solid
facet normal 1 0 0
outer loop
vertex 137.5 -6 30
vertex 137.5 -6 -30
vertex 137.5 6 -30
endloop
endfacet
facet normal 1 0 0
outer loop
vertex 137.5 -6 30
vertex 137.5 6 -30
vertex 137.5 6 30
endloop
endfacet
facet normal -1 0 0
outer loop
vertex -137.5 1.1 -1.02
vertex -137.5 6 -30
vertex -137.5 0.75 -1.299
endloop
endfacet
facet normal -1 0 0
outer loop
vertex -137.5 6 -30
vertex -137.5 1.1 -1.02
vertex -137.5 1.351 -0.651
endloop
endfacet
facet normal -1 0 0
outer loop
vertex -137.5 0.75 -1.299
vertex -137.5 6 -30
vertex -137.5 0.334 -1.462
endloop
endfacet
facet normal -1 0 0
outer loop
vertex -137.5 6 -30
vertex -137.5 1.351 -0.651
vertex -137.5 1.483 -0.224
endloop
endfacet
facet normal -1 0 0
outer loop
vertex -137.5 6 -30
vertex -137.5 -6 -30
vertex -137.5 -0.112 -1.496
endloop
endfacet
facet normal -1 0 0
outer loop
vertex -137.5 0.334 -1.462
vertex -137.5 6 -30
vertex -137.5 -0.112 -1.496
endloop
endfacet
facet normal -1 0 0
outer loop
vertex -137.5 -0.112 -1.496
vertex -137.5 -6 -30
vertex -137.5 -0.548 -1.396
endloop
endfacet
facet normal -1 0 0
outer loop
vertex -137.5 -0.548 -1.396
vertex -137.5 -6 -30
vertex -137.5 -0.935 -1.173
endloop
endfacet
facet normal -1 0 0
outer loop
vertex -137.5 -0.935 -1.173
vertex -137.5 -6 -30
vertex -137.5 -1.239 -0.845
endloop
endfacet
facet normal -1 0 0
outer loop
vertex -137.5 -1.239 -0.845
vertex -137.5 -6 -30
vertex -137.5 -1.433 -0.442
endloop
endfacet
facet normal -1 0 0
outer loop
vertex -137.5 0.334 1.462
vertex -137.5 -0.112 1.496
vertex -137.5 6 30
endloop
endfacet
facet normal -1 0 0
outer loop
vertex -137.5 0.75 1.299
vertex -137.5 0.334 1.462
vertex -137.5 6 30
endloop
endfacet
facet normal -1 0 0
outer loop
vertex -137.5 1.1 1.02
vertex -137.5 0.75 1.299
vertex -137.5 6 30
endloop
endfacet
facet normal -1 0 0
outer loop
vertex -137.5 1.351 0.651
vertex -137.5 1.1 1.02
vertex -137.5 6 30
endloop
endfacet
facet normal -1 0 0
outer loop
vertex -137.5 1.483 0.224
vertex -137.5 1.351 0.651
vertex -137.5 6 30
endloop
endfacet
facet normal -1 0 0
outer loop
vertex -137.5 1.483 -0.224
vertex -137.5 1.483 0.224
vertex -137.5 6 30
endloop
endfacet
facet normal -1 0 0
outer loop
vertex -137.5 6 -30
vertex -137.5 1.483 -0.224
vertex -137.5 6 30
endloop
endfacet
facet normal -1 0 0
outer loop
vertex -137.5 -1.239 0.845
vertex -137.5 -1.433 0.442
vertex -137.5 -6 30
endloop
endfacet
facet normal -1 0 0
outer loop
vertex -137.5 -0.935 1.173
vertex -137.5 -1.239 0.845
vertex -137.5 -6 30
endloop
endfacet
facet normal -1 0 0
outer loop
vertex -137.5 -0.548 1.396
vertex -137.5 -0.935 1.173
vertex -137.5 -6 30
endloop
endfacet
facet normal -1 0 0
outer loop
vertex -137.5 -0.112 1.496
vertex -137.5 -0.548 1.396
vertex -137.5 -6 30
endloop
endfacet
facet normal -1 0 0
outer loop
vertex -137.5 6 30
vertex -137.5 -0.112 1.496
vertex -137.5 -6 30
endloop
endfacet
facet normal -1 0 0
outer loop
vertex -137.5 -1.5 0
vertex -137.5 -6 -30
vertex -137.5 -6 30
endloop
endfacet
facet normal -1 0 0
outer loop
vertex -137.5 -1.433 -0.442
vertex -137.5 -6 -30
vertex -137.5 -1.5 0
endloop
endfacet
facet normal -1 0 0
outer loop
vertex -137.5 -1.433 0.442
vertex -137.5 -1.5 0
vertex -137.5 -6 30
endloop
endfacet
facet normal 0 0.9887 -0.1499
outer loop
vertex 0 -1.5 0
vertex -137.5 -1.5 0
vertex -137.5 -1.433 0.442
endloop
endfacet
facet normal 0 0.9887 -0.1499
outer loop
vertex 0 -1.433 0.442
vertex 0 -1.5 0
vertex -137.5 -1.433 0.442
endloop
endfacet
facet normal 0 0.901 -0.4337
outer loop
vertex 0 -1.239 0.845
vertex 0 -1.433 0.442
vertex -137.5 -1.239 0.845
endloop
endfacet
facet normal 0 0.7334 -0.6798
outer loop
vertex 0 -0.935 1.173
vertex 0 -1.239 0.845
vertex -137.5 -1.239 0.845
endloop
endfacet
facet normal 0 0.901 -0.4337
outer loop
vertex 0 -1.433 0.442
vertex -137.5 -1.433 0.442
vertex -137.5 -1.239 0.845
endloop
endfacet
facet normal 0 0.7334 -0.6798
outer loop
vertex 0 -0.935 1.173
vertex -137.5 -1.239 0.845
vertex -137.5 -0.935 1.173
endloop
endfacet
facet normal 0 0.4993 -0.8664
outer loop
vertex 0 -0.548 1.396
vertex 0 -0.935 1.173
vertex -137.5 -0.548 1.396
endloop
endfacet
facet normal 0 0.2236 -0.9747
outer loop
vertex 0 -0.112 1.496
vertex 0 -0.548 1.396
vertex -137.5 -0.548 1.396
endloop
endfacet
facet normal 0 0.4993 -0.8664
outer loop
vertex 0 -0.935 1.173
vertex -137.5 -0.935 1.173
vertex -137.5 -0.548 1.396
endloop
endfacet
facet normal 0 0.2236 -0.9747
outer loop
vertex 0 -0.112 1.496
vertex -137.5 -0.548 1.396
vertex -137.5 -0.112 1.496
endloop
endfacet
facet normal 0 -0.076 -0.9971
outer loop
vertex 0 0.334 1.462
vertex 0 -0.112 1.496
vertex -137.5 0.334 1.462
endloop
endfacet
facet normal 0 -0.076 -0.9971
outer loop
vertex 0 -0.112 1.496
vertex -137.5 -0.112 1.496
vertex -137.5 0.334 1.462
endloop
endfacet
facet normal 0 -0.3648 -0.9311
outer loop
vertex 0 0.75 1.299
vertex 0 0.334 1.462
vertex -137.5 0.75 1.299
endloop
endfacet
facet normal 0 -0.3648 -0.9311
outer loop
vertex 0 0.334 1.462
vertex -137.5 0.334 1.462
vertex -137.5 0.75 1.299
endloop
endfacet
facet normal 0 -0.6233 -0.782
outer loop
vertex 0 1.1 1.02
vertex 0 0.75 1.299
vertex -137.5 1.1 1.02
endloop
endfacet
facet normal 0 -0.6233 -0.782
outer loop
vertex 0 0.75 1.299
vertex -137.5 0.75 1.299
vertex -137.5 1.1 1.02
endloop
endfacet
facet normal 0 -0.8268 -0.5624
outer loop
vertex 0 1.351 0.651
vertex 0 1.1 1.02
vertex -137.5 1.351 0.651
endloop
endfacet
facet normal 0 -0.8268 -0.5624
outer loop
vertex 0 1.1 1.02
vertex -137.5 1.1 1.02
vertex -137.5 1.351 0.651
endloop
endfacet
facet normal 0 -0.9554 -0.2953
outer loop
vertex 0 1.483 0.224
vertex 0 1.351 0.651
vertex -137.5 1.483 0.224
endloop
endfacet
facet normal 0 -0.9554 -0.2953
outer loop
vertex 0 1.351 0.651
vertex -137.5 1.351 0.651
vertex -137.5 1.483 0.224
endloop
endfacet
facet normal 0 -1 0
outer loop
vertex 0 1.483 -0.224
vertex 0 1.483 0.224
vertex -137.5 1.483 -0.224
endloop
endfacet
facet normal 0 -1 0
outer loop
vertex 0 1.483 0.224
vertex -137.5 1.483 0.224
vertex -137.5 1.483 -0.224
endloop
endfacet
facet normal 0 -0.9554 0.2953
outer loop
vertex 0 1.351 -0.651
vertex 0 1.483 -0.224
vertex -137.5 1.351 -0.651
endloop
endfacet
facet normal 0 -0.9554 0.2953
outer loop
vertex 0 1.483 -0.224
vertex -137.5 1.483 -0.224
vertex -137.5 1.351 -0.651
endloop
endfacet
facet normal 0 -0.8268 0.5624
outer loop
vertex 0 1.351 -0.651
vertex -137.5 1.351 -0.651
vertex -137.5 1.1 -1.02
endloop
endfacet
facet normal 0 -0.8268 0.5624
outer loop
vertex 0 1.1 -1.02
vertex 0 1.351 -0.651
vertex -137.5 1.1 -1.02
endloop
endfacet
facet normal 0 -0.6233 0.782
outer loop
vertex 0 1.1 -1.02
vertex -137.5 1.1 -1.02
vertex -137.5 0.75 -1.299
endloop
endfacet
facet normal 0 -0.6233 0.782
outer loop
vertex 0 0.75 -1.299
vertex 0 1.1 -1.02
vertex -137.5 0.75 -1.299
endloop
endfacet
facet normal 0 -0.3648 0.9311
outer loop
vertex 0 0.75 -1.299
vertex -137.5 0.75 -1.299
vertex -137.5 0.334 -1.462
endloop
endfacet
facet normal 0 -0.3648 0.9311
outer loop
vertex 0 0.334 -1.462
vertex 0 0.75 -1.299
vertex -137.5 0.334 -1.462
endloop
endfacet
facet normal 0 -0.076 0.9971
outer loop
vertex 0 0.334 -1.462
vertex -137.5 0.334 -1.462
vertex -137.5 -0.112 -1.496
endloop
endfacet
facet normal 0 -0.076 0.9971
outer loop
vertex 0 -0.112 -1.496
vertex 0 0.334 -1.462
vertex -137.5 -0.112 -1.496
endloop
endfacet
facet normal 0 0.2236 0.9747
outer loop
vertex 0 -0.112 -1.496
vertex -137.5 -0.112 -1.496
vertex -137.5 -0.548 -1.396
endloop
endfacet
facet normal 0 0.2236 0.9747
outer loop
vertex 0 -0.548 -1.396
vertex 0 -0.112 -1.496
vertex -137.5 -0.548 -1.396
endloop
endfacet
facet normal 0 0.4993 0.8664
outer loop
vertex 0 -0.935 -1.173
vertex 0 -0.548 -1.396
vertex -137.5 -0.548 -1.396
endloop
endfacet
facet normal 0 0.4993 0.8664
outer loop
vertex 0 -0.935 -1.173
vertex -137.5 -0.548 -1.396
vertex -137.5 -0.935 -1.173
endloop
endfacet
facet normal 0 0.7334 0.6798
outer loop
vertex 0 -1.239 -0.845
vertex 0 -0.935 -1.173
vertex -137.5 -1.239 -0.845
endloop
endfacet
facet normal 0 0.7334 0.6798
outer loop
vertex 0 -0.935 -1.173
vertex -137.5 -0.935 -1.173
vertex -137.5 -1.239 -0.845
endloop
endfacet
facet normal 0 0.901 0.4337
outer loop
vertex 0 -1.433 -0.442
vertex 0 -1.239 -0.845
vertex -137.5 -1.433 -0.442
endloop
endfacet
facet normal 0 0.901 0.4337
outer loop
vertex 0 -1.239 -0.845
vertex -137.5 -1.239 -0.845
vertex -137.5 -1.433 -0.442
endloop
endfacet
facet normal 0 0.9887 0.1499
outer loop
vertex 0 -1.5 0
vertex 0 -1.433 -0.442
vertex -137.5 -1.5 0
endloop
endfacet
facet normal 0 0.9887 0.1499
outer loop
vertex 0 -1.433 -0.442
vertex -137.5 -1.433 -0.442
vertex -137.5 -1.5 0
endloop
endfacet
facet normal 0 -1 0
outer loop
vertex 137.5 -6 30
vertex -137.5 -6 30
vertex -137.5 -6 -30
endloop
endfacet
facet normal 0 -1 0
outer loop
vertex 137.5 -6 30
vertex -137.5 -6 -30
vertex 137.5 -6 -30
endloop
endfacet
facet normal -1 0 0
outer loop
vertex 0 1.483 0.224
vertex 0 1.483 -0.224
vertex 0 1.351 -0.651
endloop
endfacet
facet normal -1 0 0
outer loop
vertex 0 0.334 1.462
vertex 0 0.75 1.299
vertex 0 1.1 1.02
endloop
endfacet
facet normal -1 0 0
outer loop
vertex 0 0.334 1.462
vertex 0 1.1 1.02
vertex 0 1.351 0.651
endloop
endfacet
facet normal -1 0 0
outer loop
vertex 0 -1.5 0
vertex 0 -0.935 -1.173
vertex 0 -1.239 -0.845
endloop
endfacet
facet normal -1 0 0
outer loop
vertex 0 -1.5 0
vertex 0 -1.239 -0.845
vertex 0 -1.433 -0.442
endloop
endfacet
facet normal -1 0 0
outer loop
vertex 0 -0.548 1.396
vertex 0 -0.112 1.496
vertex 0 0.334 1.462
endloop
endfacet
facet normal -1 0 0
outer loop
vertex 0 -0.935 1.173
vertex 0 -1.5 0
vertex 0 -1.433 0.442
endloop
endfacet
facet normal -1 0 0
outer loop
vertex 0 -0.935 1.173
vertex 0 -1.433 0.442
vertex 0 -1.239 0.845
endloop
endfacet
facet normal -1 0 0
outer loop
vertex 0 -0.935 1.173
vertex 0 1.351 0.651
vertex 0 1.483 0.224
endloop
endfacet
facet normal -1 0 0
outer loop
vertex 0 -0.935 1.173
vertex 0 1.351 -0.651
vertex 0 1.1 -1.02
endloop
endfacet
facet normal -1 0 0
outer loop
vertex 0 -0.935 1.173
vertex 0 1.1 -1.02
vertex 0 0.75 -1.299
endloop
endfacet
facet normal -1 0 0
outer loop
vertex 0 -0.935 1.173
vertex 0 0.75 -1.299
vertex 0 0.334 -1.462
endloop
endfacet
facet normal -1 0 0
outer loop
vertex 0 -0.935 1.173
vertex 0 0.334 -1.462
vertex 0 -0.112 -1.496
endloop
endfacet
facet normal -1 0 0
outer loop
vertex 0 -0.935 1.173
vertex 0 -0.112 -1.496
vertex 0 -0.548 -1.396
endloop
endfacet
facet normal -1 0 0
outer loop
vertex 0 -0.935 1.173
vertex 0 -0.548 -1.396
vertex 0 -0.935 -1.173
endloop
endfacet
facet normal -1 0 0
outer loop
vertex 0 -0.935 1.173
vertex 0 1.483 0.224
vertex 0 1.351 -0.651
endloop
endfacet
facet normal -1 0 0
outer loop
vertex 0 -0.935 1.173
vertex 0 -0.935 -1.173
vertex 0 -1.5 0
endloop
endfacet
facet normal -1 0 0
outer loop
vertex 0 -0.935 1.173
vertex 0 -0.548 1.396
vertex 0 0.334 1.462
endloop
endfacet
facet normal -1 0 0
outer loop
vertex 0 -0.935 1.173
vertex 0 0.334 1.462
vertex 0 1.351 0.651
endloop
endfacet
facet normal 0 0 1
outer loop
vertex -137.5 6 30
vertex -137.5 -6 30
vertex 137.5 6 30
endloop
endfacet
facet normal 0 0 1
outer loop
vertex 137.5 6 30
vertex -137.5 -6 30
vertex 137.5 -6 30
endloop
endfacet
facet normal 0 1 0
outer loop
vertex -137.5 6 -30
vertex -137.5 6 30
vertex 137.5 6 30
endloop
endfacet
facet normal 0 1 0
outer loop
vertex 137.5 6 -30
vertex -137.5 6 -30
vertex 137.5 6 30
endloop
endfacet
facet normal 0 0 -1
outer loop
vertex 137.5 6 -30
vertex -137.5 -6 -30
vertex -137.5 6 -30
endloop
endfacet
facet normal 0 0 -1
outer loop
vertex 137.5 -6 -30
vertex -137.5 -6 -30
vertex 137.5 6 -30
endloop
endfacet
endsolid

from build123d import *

# Parameters (mm, degrees)
F0_W     = 275
F0_H     = 60
F1_DEPTH = 6
F2_R     = 1.5
F3_DEPTH = 137.5


with BuildPart() as f1:
    # F0 (on Front) → F1 (new body, symmetric)
    with BuildSketch(Plane.XZ):
        Rectangle(F0_W, F0_H)
    extrude(amount=F1_DEPTH, both=True)

    # F2 (on face) → F3 (cut)
    with BuildSketch(Plane(origin=(-137.5, 0, 0), x_dir=(0, -1, 0), z_dir=(-1, 0, 0))):
        Circle(F2_R)
    extrude(amount=-F3_DEPTH, mode=Mode.SUBTRACT)


solid = f1.part
